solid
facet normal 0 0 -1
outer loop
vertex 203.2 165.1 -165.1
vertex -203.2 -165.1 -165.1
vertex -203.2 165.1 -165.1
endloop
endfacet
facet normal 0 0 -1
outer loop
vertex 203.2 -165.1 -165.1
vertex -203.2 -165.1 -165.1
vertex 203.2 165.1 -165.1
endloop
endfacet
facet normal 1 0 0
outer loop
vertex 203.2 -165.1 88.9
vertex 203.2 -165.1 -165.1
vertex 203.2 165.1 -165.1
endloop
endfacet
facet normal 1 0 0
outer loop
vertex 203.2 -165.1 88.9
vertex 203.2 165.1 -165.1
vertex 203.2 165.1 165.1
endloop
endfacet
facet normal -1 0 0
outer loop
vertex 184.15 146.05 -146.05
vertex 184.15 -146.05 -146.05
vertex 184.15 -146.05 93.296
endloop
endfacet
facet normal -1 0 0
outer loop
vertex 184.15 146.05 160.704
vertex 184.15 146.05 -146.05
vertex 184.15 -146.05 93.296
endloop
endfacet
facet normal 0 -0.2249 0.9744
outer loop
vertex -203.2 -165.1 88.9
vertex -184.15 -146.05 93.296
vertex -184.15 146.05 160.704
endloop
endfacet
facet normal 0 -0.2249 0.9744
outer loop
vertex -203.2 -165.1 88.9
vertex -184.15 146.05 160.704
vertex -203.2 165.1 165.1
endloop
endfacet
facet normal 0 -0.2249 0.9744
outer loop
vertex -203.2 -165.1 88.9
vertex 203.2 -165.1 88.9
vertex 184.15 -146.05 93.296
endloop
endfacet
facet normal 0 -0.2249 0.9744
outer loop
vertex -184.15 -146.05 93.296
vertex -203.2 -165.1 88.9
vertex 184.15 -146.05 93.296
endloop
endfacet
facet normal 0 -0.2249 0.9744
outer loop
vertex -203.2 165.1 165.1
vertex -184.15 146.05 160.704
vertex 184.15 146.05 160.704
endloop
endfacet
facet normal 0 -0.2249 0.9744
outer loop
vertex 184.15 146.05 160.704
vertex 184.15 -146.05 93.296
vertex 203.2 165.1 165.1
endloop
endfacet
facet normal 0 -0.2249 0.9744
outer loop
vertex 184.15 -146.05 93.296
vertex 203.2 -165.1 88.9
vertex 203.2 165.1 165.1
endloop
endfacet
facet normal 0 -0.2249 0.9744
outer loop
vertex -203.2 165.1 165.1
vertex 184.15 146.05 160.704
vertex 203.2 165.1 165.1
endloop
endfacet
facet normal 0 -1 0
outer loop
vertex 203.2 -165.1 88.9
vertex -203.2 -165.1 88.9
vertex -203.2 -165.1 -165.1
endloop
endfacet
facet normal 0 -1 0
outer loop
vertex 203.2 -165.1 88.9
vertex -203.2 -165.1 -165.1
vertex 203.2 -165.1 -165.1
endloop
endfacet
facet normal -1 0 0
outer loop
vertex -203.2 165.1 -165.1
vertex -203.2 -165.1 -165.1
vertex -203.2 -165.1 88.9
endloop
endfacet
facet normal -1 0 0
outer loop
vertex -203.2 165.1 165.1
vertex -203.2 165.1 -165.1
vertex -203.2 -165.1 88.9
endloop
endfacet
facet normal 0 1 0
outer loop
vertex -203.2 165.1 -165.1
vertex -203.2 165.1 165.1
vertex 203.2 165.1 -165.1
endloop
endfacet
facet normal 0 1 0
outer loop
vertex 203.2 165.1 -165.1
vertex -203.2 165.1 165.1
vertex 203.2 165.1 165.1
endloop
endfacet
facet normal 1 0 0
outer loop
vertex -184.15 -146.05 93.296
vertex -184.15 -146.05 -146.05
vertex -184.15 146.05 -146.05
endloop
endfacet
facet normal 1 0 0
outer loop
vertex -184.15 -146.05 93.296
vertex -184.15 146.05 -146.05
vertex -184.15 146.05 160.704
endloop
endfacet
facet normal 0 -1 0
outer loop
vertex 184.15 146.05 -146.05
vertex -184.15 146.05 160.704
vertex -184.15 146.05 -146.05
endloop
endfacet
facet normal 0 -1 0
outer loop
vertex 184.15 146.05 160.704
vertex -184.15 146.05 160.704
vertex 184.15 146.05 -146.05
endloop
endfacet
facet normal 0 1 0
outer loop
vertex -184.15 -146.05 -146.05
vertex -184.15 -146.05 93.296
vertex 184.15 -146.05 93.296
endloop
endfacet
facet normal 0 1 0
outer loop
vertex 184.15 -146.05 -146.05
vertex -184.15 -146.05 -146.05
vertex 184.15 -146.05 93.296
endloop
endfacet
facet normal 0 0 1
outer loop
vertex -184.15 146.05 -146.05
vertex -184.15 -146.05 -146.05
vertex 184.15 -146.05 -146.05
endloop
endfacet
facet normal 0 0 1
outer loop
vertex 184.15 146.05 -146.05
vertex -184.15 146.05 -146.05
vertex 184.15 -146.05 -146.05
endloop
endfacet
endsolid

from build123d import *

# Parameters (mm, degrees)
F0_W     = 406.4
F0_H     = 330.2
F1_DEPTH = 165.1
F3_DEPTH = 406.401
F4_T     = -19.05


with BuildPart() as f1:
    # F0 (on Front) → F1 (new body, symmetric)
    with BuildSketch(Plane.XZ):
        Rectangle(F0_W, F0_H)
    extrude(amount=F1_DEPTH, both=True)

    # F2 (on face) → F3 (cut, through all)
    with BuildSketch(Plane.YZ.offset(203.2)):
        Polygon((165.1, 165.1), (-165.1, 165.1), (-165.1, 88.9), align=None)
    extrude(amount=-F3_DEPTH, mode=Mode.SUBTRACT)

    # F4
    f4_openings = [f1.faces().sort_by_distance(p)[0] for p in [
        (0, 0, 127),
    ]]
    offset(amount=F4_T, openings=f4_openings)


solid = f1.part
